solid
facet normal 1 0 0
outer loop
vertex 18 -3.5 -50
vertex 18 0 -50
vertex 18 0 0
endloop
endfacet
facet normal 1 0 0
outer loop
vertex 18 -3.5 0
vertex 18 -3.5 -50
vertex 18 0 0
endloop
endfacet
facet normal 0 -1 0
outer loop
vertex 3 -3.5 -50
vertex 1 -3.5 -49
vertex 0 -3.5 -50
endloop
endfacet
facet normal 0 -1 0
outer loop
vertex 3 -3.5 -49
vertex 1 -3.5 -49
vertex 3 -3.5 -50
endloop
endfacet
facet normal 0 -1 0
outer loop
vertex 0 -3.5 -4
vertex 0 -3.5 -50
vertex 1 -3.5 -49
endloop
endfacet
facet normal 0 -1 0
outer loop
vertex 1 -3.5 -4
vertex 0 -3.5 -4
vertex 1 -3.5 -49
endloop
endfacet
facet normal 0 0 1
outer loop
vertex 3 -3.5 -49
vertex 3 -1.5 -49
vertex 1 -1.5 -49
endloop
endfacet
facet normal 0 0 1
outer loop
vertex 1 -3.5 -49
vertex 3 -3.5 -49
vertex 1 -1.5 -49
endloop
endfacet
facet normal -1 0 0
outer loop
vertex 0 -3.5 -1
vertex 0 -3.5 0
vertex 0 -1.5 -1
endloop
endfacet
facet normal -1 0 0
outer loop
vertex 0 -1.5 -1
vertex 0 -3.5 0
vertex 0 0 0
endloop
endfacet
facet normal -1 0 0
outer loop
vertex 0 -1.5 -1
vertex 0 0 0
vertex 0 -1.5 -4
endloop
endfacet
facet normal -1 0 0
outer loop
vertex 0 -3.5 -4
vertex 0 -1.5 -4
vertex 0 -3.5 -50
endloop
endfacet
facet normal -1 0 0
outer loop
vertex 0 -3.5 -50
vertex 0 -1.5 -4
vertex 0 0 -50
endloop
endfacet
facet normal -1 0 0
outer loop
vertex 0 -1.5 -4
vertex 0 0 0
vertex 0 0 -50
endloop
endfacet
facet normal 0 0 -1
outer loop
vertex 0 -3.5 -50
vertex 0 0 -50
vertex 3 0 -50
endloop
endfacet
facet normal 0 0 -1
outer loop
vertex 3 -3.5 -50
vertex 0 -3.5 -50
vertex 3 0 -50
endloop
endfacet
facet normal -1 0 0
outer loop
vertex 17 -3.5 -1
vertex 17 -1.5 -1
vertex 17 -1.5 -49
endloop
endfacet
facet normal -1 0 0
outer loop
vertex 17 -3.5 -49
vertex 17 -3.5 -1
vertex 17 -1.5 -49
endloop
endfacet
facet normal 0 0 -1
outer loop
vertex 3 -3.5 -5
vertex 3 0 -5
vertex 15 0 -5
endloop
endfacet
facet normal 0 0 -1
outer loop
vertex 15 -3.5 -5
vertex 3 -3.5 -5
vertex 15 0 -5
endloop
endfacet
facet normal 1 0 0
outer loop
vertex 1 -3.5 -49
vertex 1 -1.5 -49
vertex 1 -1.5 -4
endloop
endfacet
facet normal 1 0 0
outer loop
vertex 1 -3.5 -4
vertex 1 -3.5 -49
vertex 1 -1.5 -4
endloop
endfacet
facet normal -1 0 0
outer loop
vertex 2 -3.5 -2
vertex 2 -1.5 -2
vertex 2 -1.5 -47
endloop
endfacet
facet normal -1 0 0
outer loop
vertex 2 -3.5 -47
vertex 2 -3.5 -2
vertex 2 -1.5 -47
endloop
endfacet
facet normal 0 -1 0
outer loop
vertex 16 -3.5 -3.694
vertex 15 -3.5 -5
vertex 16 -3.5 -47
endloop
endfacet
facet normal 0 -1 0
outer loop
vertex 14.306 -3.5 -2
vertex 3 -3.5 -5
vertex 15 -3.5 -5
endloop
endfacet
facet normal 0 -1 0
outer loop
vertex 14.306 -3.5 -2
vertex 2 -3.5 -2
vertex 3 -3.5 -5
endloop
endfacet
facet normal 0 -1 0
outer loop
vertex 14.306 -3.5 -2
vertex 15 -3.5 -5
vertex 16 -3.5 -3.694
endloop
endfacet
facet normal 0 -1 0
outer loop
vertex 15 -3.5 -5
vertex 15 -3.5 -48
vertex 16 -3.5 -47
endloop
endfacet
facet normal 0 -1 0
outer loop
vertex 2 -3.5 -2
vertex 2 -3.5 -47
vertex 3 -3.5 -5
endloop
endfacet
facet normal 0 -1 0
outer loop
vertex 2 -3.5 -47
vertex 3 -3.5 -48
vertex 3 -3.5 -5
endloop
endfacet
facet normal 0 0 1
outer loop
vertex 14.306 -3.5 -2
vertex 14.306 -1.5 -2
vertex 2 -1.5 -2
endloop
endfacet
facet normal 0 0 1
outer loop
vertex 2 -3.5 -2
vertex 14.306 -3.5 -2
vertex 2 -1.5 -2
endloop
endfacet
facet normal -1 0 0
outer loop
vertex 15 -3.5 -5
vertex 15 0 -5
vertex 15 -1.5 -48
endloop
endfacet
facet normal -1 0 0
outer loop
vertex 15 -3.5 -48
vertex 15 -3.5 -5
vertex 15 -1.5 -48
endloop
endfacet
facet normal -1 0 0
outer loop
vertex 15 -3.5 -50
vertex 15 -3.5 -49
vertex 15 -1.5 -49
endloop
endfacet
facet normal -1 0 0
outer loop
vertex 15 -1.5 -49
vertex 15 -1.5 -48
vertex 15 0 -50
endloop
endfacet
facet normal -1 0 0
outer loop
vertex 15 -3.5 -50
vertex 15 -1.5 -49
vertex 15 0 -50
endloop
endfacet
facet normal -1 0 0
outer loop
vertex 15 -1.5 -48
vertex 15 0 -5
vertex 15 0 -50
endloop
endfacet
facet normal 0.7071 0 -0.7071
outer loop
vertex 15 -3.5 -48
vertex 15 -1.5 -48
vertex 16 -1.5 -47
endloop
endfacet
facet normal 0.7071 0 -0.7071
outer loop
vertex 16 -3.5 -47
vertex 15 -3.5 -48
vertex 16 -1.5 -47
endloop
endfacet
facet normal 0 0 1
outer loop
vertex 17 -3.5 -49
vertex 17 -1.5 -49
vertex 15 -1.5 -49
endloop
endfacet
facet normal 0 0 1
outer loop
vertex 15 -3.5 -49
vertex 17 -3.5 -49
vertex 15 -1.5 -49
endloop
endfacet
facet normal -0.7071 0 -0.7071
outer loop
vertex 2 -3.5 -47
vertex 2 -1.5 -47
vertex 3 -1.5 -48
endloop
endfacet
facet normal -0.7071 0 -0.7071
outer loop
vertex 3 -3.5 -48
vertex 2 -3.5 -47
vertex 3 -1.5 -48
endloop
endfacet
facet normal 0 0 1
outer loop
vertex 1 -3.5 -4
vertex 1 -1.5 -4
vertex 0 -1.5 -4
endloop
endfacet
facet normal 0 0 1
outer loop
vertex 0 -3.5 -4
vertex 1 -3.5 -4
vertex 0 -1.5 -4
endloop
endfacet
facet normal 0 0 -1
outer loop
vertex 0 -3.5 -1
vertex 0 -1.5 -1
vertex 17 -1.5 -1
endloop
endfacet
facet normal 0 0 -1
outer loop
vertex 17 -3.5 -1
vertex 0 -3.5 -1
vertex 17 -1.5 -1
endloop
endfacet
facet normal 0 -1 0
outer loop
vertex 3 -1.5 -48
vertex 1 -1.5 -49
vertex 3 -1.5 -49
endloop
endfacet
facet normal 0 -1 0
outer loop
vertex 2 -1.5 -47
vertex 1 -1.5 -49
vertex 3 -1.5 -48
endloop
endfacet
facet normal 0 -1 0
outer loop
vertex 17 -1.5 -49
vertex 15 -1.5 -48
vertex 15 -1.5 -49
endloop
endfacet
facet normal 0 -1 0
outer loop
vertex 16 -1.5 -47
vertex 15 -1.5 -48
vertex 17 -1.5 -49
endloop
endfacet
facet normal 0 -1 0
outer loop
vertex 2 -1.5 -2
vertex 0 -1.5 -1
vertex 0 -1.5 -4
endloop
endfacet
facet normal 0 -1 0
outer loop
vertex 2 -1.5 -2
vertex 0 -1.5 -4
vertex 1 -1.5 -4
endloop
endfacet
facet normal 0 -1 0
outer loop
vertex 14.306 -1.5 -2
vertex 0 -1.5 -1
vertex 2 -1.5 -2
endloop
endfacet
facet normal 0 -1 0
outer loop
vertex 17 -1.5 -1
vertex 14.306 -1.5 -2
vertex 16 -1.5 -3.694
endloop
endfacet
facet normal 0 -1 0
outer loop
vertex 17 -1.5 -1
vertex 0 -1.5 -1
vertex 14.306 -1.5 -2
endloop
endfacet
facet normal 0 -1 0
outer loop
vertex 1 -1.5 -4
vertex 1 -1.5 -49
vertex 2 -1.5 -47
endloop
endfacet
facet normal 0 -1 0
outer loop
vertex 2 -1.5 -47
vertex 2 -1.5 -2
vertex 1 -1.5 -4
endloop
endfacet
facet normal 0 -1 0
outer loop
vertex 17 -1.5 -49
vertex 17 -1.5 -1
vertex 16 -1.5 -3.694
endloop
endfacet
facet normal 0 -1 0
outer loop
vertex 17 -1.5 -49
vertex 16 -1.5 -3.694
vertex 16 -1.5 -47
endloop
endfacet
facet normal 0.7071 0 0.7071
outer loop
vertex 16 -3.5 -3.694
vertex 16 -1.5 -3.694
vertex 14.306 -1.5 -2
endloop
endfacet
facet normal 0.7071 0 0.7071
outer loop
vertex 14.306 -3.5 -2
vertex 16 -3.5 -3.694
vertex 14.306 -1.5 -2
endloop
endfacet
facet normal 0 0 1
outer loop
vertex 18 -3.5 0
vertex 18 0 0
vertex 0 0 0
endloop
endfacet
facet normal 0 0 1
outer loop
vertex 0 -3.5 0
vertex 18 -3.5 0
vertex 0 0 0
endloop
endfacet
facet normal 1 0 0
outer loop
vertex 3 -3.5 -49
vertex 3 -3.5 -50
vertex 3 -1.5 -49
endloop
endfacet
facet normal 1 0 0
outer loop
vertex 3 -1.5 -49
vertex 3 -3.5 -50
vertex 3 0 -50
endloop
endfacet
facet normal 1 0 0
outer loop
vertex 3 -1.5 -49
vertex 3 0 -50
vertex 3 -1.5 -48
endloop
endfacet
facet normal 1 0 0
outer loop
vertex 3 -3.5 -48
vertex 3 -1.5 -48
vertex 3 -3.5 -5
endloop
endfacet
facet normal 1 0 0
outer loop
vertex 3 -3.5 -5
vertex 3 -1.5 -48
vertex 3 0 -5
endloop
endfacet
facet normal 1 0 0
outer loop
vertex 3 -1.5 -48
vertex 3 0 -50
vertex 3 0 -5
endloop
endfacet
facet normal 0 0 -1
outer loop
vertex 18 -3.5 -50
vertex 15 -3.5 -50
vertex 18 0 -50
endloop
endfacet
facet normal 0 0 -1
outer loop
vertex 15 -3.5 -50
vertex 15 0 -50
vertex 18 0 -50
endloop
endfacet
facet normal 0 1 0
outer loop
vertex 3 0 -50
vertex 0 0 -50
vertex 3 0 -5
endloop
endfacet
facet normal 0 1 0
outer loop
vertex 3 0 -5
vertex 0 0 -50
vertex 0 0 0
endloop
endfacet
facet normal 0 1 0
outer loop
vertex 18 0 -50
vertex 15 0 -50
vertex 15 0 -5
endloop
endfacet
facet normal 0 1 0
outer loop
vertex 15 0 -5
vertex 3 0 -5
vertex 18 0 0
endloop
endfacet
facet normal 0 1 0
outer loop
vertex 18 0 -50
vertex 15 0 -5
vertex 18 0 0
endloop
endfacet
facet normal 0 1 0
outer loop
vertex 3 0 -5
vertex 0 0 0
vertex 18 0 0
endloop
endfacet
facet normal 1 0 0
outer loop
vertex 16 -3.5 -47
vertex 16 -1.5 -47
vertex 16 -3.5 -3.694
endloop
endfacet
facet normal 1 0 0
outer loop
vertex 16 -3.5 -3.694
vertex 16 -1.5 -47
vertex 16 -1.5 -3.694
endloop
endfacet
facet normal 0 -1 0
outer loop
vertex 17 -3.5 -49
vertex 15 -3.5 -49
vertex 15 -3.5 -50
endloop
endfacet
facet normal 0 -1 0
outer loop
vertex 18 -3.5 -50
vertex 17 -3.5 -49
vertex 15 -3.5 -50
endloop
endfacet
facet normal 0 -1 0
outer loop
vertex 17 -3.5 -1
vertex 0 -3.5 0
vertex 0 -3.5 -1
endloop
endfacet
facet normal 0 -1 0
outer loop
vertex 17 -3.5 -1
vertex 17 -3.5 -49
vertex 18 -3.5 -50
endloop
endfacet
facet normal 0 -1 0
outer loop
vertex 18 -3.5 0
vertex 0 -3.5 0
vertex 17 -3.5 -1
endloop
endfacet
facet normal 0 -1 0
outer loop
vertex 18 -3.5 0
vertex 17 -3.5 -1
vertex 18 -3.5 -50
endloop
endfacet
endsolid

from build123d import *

# Parameters (mm, degrees)
F1_DEPTH = 1.5
F3_DEPTH = 2


with BuildPart() as f1:
    # F0 (on Front) → F1 (new body)
    with BuildSketch(Plane.XZ):
        Polygon((18, 0), (0, 0), (0, -50), (3, -50), (3, -5), (15, -5), (15, -50), (18, -50), align=None)
    extrude(amount=F1_DEPTH)

    # F2 (on face) → F3 (join)
    with BuildSketch(Plane.XZ.offset(1.5)):
        Polygon((0, 0), (0, -1), (17, -1), (17, -49), (15, -49), (15, -50), (18, -50), (18, 0), align=None)
        Polygon((15, -5), (15, -48), (16, -47), (16, -3.693556), (14.306444, -2), (2, -2), (2, -4.21096), (2, -47), (3, -48), (3, -5), align=None)
        Polygon((1, -4), (0, -4), (0, -50), (3, -50), (3, -49), (1, -49), align=None)
    extrude(amount=F3_DEPTH)


solid = f1.part
